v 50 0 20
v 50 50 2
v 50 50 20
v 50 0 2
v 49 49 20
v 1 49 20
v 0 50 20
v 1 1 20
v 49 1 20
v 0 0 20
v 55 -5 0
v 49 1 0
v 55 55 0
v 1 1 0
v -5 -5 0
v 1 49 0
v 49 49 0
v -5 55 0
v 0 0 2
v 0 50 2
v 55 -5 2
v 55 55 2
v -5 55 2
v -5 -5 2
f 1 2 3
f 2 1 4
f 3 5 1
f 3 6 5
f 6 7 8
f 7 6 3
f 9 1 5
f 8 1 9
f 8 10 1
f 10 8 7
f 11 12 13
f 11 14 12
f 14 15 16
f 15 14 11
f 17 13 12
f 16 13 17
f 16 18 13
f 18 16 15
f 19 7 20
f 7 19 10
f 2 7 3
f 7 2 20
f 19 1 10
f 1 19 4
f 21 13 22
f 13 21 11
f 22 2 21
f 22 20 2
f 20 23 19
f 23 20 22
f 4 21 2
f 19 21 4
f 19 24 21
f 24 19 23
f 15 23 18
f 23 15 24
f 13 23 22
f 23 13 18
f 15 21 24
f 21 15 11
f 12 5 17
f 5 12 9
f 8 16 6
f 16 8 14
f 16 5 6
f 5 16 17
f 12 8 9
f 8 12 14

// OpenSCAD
module kvadratas(width, wall=1) {
    difference() {
        
        height=20;
        top_width=5;
        union() {
            cube([width, width, height]);
            translate([-top_width, -top_width, 0]) {
                cube([width+2*top_width, width+2*top_width, 2]);
            }
        }
        translate([wall, wall, 0]) {
            cube([width-2*wall, width-2*wall, height+10]);
        }
    }
}

kvadratas(50, 1);
